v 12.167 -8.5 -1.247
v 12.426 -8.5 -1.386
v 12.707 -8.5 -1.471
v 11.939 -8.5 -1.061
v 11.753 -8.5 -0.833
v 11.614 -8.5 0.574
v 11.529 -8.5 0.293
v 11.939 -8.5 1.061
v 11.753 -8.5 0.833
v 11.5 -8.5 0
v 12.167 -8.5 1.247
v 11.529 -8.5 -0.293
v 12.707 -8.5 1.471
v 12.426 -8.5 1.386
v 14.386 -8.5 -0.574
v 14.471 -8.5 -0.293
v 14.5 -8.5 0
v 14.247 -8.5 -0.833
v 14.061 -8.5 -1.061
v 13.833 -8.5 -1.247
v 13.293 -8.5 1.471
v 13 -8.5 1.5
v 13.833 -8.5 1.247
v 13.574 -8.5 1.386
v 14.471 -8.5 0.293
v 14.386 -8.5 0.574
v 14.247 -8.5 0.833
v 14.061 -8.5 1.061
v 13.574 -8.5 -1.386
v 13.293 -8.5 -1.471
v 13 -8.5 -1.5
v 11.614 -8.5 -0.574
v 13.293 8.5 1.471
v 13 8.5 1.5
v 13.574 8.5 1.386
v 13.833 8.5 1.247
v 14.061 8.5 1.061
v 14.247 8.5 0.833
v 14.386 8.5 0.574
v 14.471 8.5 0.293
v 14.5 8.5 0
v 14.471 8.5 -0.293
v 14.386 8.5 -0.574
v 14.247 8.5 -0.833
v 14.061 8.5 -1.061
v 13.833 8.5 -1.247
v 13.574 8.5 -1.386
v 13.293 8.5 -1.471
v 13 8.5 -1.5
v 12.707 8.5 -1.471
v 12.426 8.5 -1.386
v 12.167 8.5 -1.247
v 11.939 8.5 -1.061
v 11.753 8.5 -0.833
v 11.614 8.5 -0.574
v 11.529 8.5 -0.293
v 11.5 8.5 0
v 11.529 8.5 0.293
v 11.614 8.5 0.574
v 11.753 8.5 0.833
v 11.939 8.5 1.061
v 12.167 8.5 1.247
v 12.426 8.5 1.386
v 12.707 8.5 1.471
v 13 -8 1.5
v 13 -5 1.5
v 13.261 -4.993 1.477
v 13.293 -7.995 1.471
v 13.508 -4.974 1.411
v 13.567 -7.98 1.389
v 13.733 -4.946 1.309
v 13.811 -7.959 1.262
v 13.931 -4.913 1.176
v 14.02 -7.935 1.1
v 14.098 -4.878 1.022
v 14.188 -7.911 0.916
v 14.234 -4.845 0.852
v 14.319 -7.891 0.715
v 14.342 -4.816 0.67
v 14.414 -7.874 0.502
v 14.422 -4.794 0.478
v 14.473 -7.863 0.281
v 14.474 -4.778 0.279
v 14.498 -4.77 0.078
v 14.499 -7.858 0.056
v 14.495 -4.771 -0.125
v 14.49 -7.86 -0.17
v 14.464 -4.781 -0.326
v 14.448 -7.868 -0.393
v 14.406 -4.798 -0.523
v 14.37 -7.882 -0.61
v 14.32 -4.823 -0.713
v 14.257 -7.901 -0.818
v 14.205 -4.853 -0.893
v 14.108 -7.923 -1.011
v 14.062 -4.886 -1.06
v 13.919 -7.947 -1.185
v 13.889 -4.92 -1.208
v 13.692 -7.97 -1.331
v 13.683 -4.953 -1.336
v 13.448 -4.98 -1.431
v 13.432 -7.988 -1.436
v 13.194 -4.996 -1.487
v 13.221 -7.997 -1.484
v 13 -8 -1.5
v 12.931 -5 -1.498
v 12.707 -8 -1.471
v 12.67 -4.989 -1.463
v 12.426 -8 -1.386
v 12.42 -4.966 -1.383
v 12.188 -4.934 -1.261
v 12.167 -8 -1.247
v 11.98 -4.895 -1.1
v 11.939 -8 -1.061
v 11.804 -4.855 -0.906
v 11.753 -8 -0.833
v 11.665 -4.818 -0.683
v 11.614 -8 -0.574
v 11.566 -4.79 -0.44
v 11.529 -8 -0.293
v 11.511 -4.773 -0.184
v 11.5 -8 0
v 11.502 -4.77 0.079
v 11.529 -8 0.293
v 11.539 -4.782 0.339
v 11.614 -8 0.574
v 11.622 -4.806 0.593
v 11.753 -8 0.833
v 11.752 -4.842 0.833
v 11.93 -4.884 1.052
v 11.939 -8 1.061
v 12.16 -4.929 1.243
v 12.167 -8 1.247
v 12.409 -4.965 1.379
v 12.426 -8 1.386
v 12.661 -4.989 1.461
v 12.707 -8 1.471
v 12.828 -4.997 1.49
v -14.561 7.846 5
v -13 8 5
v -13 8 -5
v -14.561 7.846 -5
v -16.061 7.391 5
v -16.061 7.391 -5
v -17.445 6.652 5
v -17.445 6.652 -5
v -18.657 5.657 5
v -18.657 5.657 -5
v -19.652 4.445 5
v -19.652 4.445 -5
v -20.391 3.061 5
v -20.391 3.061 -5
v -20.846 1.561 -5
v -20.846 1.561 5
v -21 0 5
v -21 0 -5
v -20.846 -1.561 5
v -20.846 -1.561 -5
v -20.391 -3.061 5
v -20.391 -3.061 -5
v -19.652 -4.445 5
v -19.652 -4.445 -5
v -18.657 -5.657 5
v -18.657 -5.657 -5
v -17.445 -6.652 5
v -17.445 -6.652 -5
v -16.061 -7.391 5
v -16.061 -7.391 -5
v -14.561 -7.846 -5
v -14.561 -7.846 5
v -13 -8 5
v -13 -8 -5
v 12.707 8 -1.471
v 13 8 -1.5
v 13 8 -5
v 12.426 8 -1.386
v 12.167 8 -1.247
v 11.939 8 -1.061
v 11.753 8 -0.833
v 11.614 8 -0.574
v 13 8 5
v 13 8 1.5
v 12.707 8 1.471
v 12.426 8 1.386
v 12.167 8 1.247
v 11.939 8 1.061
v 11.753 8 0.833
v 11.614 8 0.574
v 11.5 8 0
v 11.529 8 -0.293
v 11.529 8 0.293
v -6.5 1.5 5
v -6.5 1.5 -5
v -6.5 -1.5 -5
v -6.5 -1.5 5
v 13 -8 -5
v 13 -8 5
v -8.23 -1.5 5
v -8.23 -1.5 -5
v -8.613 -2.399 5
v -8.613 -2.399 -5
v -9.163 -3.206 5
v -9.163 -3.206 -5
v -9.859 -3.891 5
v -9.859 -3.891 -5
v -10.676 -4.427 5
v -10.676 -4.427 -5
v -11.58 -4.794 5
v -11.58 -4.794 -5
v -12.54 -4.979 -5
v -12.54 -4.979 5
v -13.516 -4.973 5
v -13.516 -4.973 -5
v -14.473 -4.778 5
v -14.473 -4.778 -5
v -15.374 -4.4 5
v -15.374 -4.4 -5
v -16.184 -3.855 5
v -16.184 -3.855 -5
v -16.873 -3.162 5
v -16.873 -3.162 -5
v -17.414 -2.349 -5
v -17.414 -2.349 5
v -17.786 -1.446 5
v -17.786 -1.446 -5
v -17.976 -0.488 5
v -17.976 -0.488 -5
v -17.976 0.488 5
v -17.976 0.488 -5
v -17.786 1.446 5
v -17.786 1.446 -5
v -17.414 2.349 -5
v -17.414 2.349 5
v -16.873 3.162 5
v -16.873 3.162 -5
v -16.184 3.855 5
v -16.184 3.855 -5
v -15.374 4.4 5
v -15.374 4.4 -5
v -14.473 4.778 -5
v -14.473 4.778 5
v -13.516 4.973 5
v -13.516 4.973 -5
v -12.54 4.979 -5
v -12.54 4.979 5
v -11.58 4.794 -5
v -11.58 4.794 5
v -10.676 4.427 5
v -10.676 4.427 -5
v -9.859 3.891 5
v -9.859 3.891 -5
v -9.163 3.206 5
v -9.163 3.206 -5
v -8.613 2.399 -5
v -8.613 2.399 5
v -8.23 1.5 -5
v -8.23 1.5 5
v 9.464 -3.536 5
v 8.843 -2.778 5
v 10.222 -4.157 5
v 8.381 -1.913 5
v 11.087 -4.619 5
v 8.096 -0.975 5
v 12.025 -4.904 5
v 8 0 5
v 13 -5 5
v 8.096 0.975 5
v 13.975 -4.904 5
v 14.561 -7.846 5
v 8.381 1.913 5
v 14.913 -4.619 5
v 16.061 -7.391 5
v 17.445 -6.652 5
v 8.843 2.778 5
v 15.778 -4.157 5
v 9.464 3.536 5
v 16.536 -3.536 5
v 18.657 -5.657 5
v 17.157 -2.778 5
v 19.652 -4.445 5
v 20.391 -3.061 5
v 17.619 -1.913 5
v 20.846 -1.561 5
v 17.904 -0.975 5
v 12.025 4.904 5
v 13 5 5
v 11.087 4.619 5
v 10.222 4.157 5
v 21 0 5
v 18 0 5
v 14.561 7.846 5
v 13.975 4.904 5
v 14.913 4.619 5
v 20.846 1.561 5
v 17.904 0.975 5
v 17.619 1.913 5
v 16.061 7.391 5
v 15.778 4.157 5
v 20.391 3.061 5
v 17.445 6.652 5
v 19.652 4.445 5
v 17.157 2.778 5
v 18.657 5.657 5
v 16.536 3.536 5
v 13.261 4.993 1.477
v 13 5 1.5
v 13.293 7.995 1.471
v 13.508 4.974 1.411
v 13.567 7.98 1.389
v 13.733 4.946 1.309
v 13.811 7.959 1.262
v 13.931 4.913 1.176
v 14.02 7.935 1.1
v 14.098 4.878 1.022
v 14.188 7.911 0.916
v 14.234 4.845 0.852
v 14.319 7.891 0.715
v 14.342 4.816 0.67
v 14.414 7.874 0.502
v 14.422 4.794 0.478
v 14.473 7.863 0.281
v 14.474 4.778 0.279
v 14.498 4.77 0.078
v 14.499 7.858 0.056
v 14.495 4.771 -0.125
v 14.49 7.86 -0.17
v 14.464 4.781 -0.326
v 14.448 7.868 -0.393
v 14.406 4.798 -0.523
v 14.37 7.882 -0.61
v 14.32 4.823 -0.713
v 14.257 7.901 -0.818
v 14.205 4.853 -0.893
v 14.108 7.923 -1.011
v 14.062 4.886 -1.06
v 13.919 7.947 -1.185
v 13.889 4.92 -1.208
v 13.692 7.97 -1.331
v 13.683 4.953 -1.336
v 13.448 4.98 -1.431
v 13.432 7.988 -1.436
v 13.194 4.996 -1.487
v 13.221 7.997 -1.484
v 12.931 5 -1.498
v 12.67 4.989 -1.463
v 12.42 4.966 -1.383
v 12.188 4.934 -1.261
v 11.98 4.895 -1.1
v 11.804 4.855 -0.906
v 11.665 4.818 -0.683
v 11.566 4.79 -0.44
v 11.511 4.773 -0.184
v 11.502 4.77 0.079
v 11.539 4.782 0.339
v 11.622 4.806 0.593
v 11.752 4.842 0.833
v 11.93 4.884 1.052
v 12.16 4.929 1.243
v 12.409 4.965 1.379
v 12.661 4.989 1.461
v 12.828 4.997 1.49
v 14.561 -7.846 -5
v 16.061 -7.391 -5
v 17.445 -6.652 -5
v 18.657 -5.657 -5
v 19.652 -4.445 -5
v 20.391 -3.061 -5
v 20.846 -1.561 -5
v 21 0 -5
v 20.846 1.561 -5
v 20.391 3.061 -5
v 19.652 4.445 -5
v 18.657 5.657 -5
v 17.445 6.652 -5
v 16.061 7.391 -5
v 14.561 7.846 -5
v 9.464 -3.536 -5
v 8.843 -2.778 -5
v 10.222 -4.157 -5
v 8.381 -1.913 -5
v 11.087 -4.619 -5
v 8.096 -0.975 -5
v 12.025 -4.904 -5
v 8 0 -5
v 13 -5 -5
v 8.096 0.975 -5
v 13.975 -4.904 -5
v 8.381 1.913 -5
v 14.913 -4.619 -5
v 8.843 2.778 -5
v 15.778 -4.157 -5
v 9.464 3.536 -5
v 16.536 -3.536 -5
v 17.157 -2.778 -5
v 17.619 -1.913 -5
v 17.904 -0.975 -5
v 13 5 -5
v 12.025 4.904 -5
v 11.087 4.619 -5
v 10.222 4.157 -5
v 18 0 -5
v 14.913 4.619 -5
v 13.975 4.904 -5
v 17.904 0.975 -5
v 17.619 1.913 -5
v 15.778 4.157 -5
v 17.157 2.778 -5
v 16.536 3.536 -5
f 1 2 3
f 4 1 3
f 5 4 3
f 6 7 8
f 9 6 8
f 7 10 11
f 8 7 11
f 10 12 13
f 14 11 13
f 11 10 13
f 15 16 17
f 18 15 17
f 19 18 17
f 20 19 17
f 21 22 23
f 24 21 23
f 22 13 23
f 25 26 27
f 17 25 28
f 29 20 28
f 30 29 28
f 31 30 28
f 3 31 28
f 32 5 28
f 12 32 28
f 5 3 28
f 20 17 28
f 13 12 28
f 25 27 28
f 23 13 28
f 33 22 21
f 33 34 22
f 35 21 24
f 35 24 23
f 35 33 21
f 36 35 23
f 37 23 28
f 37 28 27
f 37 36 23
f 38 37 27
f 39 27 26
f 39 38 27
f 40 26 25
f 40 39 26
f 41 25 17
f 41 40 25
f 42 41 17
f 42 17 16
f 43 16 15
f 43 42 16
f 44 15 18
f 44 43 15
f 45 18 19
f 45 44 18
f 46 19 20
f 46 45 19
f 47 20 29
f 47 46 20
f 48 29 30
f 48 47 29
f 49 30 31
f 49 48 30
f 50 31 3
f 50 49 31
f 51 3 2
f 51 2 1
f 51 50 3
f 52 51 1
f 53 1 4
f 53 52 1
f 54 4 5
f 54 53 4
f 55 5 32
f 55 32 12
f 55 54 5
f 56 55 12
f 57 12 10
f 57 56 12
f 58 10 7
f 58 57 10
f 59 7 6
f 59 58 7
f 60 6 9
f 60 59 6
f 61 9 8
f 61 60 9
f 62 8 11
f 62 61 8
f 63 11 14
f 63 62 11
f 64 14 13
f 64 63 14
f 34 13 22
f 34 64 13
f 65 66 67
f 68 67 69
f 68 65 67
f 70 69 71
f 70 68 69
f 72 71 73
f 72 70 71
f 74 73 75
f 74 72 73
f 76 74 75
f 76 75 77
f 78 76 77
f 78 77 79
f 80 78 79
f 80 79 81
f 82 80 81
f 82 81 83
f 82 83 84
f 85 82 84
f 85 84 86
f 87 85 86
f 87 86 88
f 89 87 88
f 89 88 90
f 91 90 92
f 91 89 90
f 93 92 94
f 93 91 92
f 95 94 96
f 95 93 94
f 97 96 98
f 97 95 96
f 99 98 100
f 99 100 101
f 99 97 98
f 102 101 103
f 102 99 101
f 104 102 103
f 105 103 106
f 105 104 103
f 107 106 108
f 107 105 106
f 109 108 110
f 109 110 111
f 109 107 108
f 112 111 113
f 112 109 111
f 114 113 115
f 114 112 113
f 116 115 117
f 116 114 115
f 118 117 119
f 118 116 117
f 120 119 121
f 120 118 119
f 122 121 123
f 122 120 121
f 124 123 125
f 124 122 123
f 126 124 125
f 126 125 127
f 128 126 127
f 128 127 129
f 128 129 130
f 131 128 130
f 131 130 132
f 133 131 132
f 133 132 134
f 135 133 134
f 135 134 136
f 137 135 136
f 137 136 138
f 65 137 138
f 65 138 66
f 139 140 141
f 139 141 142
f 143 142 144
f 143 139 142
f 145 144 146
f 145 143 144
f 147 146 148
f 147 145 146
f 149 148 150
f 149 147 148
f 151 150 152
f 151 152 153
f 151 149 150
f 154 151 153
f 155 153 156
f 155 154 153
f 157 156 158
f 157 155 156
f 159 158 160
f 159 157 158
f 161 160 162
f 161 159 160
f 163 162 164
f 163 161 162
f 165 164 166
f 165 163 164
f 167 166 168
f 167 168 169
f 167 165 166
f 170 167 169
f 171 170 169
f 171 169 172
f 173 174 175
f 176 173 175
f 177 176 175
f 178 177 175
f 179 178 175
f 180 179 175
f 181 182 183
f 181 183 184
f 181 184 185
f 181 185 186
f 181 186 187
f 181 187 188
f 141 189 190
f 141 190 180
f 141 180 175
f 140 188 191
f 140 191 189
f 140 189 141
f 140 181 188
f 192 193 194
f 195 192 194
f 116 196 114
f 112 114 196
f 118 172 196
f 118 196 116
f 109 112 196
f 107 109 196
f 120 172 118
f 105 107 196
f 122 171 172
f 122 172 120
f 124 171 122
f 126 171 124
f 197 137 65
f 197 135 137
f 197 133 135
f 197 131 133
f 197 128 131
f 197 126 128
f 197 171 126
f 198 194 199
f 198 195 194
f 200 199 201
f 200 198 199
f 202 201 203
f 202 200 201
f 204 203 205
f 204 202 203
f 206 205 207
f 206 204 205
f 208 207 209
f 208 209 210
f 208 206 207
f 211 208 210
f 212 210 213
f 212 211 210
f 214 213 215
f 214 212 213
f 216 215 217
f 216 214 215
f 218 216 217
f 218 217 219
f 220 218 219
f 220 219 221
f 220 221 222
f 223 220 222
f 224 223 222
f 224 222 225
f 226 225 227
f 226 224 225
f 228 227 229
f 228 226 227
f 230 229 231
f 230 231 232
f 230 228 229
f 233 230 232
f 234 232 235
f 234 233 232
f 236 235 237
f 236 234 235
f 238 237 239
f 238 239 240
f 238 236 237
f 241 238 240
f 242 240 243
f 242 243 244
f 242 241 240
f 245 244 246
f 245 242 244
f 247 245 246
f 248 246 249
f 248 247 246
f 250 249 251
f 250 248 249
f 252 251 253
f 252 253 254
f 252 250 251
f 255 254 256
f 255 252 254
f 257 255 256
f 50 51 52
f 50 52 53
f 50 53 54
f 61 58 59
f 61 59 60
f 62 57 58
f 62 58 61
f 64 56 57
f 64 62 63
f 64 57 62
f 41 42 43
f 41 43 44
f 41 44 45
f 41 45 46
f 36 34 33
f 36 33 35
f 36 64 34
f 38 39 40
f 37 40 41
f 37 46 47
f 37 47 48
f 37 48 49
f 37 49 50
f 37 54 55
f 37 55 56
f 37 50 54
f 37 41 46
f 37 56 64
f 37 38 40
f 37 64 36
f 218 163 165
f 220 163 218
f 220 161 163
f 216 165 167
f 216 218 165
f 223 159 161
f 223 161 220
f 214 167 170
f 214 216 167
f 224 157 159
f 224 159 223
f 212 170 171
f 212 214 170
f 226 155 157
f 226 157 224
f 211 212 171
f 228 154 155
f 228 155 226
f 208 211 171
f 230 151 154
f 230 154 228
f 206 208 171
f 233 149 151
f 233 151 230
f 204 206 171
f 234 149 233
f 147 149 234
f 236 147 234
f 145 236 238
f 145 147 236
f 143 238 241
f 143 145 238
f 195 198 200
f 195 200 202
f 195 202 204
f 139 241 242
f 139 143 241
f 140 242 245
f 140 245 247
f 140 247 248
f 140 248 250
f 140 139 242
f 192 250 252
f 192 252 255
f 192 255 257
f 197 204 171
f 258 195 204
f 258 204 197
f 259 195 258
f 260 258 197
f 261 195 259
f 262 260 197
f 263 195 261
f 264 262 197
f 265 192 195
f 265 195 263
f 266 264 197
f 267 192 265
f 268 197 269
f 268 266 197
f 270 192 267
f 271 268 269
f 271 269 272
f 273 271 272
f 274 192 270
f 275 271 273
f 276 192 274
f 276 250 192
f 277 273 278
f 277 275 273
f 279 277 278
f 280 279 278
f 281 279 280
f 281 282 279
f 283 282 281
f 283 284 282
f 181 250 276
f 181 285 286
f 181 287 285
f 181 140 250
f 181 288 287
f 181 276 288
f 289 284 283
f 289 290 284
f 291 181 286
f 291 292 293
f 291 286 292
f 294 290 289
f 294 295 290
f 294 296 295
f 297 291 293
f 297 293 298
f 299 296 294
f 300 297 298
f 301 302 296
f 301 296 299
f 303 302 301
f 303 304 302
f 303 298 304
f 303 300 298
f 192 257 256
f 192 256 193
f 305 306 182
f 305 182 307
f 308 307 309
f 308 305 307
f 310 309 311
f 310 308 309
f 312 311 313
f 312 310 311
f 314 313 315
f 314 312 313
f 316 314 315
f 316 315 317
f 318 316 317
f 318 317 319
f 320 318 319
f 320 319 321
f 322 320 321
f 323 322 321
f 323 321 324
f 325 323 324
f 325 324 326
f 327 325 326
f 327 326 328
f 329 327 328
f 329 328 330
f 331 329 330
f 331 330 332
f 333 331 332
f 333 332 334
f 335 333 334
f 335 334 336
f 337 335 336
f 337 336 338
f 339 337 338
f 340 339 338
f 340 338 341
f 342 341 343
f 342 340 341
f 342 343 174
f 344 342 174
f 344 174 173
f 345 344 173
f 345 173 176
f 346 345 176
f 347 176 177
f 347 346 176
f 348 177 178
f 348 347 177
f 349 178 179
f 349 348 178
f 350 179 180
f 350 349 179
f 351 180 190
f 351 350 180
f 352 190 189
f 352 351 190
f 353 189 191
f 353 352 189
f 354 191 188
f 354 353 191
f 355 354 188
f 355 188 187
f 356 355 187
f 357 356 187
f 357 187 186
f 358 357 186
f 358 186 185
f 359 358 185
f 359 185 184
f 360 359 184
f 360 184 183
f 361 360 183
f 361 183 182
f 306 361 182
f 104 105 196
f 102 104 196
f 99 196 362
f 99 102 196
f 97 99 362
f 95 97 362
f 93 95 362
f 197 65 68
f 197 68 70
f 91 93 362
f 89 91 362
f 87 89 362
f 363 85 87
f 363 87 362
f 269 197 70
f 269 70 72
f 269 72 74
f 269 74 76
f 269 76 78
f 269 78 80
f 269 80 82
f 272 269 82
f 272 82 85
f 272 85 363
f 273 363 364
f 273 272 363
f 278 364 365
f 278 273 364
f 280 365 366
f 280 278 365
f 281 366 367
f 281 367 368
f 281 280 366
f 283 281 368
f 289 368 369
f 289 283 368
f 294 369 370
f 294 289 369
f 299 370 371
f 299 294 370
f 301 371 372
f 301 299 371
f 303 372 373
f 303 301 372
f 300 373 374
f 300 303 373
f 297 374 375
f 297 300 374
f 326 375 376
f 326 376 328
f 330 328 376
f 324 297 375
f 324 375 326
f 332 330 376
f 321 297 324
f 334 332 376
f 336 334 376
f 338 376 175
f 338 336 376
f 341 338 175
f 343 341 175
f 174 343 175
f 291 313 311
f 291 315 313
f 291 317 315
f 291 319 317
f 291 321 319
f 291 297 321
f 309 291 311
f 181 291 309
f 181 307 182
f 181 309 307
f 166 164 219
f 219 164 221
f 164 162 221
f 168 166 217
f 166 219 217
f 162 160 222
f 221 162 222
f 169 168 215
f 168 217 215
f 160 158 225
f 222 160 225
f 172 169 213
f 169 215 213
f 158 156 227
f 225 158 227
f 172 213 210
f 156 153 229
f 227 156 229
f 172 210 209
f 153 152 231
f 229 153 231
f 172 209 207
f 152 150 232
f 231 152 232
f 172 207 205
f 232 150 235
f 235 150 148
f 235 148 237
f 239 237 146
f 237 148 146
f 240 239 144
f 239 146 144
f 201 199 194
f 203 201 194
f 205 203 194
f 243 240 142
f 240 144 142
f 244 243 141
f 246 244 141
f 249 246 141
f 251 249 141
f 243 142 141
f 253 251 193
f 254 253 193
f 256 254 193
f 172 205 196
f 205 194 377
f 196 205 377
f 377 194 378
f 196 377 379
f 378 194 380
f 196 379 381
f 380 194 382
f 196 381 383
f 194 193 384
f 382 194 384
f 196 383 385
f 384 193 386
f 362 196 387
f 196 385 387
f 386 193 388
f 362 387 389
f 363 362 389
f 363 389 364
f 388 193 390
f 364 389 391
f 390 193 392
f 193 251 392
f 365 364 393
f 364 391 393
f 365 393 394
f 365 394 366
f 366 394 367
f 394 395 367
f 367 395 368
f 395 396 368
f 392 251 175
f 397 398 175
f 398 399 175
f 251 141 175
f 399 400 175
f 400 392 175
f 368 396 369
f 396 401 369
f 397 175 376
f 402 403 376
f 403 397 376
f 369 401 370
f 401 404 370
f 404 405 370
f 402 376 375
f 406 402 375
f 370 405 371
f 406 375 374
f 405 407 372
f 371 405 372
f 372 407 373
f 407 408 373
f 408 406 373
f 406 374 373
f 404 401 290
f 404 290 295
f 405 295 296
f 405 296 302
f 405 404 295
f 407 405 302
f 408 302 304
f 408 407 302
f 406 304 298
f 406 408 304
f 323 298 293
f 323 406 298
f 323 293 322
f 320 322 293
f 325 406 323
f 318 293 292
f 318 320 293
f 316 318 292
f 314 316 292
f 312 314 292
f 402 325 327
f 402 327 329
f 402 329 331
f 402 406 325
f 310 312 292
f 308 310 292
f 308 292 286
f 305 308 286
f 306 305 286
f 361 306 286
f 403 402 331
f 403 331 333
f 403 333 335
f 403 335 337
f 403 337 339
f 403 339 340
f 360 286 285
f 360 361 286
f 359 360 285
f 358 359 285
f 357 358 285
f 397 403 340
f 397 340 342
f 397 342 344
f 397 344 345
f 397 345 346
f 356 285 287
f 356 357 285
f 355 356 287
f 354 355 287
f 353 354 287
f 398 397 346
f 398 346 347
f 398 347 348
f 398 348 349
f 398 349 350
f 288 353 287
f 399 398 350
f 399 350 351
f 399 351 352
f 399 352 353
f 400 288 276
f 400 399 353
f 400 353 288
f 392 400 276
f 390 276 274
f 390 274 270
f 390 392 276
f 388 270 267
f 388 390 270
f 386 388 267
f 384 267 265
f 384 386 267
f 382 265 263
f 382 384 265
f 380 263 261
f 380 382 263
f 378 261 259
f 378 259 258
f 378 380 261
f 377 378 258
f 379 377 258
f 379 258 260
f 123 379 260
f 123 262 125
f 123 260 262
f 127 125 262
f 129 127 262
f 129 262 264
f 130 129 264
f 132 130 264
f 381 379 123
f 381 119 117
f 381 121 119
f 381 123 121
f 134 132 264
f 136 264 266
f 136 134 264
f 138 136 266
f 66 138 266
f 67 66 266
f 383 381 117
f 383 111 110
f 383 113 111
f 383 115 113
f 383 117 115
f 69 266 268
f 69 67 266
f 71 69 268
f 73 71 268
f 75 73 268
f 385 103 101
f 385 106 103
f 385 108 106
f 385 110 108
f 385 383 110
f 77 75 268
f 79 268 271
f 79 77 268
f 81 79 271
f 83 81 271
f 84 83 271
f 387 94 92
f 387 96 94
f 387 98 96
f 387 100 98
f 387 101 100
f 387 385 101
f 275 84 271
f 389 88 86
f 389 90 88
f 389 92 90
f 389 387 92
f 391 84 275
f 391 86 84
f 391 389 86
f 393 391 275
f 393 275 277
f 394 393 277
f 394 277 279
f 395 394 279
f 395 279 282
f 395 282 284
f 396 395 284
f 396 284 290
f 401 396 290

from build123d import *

# Parameters (mm, degrees)
SKETCH1_R               = 5
BOSS_EXTRUDE1_DEPTH     = 5
CUT_EXTRUDE1_DEPTH      = 24.021728866
CUT_EXTRUDE1_DEPTH_BACK = 24.021728866
SKETCH2_R               = 1.5
SKETCH2_2_R             = 1.5
BOSS_EXTRUDE2_DEPTH     = 8.5


with BuildPart() as part:
    # Sketch1 → Boss-Extrude1 (new, symmetric)
    with BuildSketch(Plane.XY):
        with BuildLine():
            Line((13, 8), (-13, 8))
            ThreePointArc((-13, 8), (-21, 0), (-13, -8))
            Line((-13, -8), (13, -8))
            ThreePointArc((13, -8), (21, 0), (13, 8))
        make_face()
        with Locations((13, 0)):
            Circle(SKETCH1_R, mode=Mode.SUBTRACT)
        with BuildLine():
            Line((-8.230303993, 1.5), (-6.5, 1.5))
            Line((-6.5, 1.5), (-6.5, -1.5))
            Line((-6.5, -1.5), (-8.230303993, -1.5))
            ThreePointArc((-8.230303993, -1.5), (-18, 0), (-8.230303993, 1.5))
        make_face(mode=Mode.SUBTRACT)
    extrude(amount=BOSS_EXTRUDE1_DEPTH, both=True)

    # Sketch2 → Cut-Extrude1 (cut, two sides: drawn at the far end of the back side and taken through both)
    with BuildSketch(Plane(origin=(0, 0, 0), x_dir=(1, 0, 0), z_dir=(0, 1, 0)).offset(-CUT_EXTRUDE1_DEPTH_BACK)):
        with Locations((13, 0)):
            Circle(SKETCH2_R)
    extrude(amount=CUT_EXTRUDE1_DEPTH + CUT_EXTRUDE1_DEPTH_BACK, mode=Mode.SUBTRACT)


with BuildPart() as body_2:
    # Sketch2<2> → Boss-Extrude2 (new, symmetric)
    with BuildSketch(Plane(origin=(0, 0, 0), x_dir=(1, 0, 0), z_dir=(0, 1, 0))):
        with Locations((13, 0)):
            Circle(SKETCH2_2_R)
    extrude(amount=BOSS_EXTRUDE2_DEPTH, both=True)


solid = Compound([part.part, body_2.part])
